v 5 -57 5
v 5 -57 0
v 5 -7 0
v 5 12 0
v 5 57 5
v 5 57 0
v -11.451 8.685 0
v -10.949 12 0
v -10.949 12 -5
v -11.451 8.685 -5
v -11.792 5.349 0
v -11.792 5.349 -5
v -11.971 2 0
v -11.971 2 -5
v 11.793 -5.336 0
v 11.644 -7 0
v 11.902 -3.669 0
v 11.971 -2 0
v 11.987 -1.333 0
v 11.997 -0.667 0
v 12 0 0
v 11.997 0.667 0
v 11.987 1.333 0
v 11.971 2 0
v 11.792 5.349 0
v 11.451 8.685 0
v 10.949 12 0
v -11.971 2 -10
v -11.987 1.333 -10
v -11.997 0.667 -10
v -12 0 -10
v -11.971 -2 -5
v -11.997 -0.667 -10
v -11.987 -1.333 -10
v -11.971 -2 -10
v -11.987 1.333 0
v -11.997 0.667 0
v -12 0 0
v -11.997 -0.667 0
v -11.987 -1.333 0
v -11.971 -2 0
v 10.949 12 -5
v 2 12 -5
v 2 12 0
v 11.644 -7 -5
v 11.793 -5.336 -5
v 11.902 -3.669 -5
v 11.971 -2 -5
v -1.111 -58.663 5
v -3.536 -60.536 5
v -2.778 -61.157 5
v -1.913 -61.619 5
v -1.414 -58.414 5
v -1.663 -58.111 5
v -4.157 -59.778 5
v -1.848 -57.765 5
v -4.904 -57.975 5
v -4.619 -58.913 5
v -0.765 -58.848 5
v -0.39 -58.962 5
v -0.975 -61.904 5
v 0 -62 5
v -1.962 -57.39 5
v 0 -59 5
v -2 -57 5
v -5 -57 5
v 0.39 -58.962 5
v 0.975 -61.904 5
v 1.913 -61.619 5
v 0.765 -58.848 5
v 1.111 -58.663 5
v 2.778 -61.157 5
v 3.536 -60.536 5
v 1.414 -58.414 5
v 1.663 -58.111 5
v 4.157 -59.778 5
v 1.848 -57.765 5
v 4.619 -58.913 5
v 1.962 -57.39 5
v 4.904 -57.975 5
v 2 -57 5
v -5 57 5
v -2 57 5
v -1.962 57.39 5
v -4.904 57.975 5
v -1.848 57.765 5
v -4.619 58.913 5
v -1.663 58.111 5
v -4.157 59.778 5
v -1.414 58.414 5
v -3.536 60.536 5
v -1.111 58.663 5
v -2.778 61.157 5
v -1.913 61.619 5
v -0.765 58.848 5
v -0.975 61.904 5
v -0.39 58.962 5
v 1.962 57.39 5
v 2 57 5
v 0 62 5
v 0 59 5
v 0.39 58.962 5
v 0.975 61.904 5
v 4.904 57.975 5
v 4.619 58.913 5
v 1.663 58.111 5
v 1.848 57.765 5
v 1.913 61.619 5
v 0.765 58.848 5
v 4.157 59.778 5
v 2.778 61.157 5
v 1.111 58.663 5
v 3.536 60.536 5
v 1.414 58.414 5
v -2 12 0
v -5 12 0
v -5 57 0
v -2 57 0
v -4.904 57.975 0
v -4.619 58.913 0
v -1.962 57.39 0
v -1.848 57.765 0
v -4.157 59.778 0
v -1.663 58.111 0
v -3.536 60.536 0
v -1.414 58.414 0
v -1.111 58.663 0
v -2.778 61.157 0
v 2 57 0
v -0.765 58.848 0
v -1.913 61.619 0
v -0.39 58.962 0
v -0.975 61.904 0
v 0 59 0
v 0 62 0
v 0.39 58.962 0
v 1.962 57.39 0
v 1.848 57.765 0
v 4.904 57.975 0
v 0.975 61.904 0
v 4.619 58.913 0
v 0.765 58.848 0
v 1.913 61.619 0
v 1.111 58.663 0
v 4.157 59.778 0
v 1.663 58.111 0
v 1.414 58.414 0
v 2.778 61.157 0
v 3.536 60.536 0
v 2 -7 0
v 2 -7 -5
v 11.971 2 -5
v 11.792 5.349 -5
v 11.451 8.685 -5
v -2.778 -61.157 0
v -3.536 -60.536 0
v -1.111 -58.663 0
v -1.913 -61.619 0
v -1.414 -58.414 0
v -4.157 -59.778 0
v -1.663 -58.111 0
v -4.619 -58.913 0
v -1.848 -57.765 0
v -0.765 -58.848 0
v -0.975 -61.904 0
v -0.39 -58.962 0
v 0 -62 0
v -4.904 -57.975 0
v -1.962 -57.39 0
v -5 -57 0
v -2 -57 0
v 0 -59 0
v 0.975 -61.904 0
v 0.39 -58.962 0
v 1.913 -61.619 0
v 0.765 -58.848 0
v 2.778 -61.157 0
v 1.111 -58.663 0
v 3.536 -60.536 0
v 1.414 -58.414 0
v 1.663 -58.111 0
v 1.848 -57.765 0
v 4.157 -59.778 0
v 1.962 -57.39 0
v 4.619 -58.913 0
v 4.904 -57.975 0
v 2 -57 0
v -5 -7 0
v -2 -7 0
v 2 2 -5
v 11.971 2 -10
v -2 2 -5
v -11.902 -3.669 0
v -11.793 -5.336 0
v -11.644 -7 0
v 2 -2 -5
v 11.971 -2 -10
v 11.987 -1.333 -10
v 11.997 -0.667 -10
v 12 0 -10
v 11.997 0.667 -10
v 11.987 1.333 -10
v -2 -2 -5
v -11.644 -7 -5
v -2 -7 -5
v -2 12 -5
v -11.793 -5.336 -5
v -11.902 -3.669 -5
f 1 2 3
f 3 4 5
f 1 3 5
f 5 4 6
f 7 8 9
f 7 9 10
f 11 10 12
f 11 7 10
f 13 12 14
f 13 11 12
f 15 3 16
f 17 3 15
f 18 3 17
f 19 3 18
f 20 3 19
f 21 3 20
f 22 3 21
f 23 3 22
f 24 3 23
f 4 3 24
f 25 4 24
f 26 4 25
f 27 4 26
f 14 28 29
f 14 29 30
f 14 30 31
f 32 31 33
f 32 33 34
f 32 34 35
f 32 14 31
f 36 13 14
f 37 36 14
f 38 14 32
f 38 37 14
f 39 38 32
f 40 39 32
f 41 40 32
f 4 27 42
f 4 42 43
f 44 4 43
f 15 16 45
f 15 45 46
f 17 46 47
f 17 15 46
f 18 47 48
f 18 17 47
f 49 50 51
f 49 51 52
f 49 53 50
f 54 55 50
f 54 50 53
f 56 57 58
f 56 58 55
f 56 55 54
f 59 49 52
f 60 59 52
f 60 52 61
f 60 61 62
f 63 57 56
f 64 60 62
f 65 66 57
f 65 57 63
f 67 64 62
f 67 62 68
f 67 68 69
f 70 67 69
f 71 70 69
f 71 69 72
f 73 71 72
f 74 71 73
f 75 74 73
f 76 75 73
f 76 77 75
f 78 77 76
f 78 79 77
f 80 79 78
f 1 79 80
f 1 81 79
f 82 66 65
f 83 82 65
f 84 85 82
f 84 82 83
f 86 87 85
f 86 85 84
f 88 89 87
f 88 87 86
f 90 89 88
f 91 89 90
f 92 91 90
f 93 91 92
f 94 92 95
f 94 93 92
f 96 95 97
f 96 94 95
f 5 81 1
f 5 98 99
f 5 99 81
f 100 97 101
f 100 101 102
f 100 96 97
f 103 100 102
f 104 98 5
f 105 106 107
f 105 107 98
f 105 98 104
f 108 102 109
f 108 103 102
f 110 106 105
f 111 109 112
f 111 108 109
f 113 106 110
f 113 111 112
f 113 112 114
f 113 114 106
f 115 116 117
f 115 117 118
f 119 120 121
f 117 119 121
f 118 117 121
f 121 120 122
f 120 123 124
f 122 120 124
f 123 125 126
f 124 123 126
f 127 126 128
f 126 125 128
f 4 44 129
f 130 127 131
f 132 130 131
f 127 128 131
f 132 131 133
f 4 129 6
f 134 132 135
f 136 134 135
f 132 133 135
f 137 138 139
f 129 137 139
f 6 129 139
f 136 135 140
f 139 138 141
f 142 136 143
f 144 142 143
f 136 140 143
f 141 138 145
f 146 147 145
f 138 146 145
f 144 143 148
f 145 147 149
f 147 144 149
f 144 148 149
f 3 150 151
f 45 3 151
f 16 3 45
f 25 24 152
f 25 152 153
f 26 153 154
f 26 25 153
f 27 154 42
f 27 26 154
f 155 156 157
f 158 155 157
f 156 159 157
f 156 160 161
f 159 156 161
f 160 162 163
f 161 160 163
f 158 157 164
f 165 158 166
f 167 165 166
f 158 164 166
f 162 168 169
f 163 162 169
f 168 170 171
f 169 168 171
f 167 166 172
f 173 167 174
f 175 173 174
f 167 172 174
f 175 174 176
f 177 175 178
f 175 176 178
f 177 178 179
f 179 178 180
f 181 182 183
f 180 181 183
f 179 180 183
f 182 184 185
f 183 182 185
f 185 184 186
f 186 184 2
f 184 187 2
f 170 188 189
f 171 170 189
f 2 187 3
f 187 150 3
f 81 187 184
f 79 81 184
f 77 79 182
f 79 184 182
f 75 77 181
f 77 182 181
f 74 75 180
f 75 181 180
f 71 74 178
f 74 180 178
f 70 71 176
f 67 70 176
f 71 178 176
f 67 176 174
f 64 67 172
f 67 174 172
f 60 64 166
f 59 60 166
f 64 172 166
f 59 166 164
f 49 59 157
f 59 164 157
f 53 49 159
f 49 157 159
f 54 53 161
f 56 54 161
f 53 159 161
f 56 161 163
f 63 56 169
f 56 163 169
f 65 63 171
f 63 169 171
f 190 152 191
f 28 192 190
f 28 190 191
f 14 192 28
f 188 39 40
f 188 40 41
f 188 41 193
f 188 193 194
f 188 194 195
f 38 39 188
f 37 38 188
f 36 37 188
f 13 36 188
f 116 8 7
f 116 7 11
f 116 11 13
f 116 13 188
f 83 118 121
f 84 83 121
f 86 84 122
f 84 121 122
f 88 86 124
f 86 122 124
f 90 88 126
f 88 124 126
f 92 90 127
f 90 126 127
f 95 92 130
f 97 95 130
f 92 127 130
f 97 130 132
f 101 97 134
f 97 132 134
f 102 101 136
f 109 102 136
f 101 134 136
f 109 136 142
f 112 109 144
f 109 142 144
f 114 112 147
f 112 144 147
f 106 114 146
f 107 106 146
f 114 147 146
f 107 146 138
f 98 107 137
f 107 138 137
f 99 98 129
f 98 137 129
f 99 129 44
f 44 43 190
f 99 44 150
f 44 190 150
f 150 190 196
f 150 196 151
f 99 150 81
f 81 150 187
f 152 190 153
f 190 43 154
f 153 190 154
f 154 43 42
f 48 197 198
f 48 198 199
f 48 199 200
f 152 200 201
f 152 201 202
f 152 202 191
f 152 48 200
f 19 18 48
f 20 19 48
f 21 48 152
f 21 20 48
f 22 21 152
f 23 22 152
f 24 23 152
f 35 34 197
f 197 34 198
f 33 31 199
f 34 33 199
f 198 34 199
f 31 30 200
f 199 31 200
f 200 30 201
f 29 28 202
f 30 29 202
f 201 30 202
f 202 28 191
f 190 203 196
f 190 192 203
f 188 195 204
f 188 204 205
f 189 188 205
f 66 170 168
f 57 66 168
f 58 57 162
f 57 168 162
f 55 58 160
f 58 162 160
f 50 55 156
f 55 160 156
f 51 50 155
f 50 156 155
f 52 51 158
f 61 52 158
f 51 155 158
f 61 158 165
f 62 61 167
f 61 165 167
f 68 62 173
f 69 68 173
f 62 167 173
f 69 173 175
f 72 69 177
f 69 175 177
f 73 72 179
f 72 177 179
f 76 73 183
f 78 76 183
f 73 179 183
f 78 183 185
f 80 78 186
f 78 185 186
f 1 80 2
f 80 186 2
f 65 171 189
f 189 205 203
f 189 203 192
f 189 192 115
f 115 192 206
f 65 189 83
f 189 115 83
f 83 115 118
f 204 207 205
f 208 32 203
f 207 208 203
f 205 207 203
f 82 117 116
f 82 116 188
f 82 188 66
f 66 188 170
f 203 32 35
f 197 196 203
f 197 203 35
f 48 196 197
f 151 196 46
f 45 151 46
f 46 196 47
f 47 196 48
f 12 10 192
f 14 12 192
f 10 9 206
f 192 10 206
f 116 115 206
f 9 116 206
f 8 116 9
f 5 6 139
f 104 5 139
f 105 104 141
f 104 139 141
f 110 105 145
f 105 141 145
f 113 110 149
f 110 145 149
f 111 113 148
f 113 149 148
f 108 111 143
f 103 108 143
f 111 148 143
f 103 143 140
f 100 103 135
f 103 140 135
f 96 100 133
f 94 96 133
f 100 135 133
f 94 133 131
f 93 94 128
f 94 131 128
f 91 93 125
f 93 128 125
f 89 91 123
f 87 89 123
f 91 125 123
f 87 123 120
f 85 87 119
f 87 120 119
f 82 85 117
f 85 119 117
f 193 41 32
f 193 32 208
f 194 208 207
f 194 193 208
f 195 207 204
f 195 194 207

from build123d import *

# Parameters (mm, degrees)
F0_W     = 3
F0_H     = 10
F0_H_2   = 5
F1_DEPTH = 5
F2_START = -5
F2_DEPTH = 5
F3_DEPTH = 5


with BuildPart() as f1:
    # F0 (on Top) → F1 (new body)
    with BuildSketch(Plane.XY):
        with Locations((3.5, 7)):
            Rectangle(F0_W, F0_H)
        with BuildLine():
            Line((10.9485099174, 12), (5, 12))
            Line((5, 12), (5, 2))
            Line((5, 2), (11.9710084021, 2))
            ThreePointArc((11.9710084021, 2), (11.6421053306, 7.0186448683), (10.9485099174, 12))
        make_face()
        Polygon((5, 2), (2, 2), (2, -2), (5, -2), (5, 0), align=None)
        with BuildLine():
            Line((11.9710084021, 2), (5, 2))
            Line((5, 2), (5, 0))
            Line((5, 0), (5, -2))
            Line((5, -2), (11.9710084021, -2))
            ThreePointArc((11.9710084021, -2), (11.9927517198, -1.0001050586), (12, 0))
            ThreePointArc((12, 0), (11.9927517198, 1.0001050586), (11.9710084021, 2))
        make_face()
        with Locations((3.5, -4.5)):
            Rectangle(F0_W, F0_H_2)
        with BuildLine():
            Line((11.9710084021, -2), (5, -2))
            Line((5, -2), (5, -7))
            Line((5, -7), (11.6440092069, -7))
            ThreePointArc((11.6440092069, -7), (11.8529103806, -4.5029692558), (11.9710084021, -2))
        make_face()
    extrude(amount=-F1_DEPTH)



with BuildPart() as f1b:
    # F0 (on Top) → F1, piece 2 (new body)
    with BuildSketch(Plane.XY):
        with Locations((-3.5, 7)):
            Rectangle(F0_W, F0_H)
        with BuildLine():
            Line((-5, 2), (-5, 12))
            Line((-5, 12), (-10.9485099174, 12))
            ThreePointArc((-10.9485099174, 12), (-11.6421053306, 7.0186448683), (-11.9710084021, 2))
            Line((-11.9710084021, 2), (-5, 2))
        make_face()
        Polygon((-2, -2), (-2, 2), (-5, 2), (-5, 0), (-5, -2), align=None)
        with BuildLine():
            Line((-5, 0), (-5, 2))
            Line((-5, 2), (-11.9710084021, 2))
            ThreePointArc((-11.9710084021, 2), (-11.9927517198, 1.0001050586), (-12, 0))
            ThreePointArc((-12, 0), (-11.9927517198, -1.0001050586), (-11.9710084021, -2))
            Line((-11.9710084021, -2), (-5, -2))
            Line((-5, -2), (-5, 0))
        make_face()
        with Locations((-3.5, -4.5)):
            Rectangle(F0_W, F0_H_2)
        with BuildLine():
            Line((-5, -7), (-5, -2))
            Line((-5, -2), (-11.9710084021, -2))
            ThreePointArc((-11.9710084021, -2), (-11.8529103806, -4.5029692558), (-11.6440092069, -7))
            Line((-11.6440092069, -7), (-5, -7))
        make_face()
    extrude(amount=-F1_DEPTH)


with BuildPart() as f1_1:
    add(f1.part)

    add(f1b.part)  # F2 merges F1b
    # F0 (on Top) → F2 (join)
    with BuildSketch(Plane.XY.offset(F2_START)):
        Polygon((2, -2), (2, 2), (0, 2), (-2, 2), (-2, -2), (0, -2), align=None)
        Polygon((5, 2), (2, 2), (2, -2), (5, -2), (5, 0), align=None)
        Polygon((-2, -2), (-2, 2), (-5, 2), (-5, 0), (-5, -2), align=None)
        with BuildLine():
            Line((11.9710084021, 2), (5, 2))
            Line((5, 2), (5, 0))
            Line((5, 0), (5, -2))
            Line((5, -2), (11.9710084021, -2))
            ThreePointArc((11.9710084021, -2), (11.9927517198, -1.0001050586), (12, 0))
            ThreePointArc((12, 0), (11.9927517198, 1.0001050586), (11.9710084021, 2))
        make_face()
        with BuildLine():
            Line((-5, 0), (-5, 2))
            Line((-5, 2), (-11.9710084021, 2))
            ThreePointArc((-11.9710084021, 2), (-11.9927517198, 1.0001050586), (-12, 0))
            ThreePointArc((-12, 0), (-11.9927517198, -1.0001050586), (-11.9710084021, -2))
            Line((-11.9710084021, -2), (-5, -2))
            Line((-5, -2), (-5, 0))
        make_face()
    extrude(amount=-F2_DEPTH)

    # F0 (on Top) → F3 (join)
    with BuildSketch(Plane.XY):
        with BuildLine():
            ThreePointArc((-2, 57), (0, 59), (2, 57))
            Line((2, 57), (2, 12))
            Line((2, 12), (5, 12))
            Line((5, 12), (5, 57))
            ThreePointArc((5, 57), (0, 62), (-5, 57))
            Line((-5, 57), (-5, 12))
            Line((-5, 12), (-2, 12))
            Line((-2, 12), (-2, 57))
        make_face()
        with Locations((3.5, 7)):
            Rectangle(F0_W, F0_H)
        with Locations((-3.5, 7)):
            Rectangle(F0_W, F0_H)
        Polygon((5, 2), (2, 2), (2, -2), (5, -2), (5, 0), align=None)
        Polygon((-2, -2), (-2, 2), (-5, 2), (-5, 0), (-5, -2), align=None)
        with Locations((3.5, -4.5)):
            Rectangle(F0_W, F0_H_2)
        with Locations((-3.5, -4.5)):
            Rectangle(F0_W, F0_H_2)
        with BuildLine():
            Line((5, -7), (2, -7))
            Line((2, -7), (2, -57))
            ThreePointArc((2, -57), (0, -59), (-2, -57))
            Line((-2, -57), (-2, -7))
            Line((-2, -7), (-5, -7))
            Line((-5, -7), (-5, -57))
            ThreePointArc((-5, -57), (0, -62), (5, -57))
            Line((5, -57), (5, -7))
        make_face()
    extrude(amount=F3_DEPTH)


solid = f1_1.part
